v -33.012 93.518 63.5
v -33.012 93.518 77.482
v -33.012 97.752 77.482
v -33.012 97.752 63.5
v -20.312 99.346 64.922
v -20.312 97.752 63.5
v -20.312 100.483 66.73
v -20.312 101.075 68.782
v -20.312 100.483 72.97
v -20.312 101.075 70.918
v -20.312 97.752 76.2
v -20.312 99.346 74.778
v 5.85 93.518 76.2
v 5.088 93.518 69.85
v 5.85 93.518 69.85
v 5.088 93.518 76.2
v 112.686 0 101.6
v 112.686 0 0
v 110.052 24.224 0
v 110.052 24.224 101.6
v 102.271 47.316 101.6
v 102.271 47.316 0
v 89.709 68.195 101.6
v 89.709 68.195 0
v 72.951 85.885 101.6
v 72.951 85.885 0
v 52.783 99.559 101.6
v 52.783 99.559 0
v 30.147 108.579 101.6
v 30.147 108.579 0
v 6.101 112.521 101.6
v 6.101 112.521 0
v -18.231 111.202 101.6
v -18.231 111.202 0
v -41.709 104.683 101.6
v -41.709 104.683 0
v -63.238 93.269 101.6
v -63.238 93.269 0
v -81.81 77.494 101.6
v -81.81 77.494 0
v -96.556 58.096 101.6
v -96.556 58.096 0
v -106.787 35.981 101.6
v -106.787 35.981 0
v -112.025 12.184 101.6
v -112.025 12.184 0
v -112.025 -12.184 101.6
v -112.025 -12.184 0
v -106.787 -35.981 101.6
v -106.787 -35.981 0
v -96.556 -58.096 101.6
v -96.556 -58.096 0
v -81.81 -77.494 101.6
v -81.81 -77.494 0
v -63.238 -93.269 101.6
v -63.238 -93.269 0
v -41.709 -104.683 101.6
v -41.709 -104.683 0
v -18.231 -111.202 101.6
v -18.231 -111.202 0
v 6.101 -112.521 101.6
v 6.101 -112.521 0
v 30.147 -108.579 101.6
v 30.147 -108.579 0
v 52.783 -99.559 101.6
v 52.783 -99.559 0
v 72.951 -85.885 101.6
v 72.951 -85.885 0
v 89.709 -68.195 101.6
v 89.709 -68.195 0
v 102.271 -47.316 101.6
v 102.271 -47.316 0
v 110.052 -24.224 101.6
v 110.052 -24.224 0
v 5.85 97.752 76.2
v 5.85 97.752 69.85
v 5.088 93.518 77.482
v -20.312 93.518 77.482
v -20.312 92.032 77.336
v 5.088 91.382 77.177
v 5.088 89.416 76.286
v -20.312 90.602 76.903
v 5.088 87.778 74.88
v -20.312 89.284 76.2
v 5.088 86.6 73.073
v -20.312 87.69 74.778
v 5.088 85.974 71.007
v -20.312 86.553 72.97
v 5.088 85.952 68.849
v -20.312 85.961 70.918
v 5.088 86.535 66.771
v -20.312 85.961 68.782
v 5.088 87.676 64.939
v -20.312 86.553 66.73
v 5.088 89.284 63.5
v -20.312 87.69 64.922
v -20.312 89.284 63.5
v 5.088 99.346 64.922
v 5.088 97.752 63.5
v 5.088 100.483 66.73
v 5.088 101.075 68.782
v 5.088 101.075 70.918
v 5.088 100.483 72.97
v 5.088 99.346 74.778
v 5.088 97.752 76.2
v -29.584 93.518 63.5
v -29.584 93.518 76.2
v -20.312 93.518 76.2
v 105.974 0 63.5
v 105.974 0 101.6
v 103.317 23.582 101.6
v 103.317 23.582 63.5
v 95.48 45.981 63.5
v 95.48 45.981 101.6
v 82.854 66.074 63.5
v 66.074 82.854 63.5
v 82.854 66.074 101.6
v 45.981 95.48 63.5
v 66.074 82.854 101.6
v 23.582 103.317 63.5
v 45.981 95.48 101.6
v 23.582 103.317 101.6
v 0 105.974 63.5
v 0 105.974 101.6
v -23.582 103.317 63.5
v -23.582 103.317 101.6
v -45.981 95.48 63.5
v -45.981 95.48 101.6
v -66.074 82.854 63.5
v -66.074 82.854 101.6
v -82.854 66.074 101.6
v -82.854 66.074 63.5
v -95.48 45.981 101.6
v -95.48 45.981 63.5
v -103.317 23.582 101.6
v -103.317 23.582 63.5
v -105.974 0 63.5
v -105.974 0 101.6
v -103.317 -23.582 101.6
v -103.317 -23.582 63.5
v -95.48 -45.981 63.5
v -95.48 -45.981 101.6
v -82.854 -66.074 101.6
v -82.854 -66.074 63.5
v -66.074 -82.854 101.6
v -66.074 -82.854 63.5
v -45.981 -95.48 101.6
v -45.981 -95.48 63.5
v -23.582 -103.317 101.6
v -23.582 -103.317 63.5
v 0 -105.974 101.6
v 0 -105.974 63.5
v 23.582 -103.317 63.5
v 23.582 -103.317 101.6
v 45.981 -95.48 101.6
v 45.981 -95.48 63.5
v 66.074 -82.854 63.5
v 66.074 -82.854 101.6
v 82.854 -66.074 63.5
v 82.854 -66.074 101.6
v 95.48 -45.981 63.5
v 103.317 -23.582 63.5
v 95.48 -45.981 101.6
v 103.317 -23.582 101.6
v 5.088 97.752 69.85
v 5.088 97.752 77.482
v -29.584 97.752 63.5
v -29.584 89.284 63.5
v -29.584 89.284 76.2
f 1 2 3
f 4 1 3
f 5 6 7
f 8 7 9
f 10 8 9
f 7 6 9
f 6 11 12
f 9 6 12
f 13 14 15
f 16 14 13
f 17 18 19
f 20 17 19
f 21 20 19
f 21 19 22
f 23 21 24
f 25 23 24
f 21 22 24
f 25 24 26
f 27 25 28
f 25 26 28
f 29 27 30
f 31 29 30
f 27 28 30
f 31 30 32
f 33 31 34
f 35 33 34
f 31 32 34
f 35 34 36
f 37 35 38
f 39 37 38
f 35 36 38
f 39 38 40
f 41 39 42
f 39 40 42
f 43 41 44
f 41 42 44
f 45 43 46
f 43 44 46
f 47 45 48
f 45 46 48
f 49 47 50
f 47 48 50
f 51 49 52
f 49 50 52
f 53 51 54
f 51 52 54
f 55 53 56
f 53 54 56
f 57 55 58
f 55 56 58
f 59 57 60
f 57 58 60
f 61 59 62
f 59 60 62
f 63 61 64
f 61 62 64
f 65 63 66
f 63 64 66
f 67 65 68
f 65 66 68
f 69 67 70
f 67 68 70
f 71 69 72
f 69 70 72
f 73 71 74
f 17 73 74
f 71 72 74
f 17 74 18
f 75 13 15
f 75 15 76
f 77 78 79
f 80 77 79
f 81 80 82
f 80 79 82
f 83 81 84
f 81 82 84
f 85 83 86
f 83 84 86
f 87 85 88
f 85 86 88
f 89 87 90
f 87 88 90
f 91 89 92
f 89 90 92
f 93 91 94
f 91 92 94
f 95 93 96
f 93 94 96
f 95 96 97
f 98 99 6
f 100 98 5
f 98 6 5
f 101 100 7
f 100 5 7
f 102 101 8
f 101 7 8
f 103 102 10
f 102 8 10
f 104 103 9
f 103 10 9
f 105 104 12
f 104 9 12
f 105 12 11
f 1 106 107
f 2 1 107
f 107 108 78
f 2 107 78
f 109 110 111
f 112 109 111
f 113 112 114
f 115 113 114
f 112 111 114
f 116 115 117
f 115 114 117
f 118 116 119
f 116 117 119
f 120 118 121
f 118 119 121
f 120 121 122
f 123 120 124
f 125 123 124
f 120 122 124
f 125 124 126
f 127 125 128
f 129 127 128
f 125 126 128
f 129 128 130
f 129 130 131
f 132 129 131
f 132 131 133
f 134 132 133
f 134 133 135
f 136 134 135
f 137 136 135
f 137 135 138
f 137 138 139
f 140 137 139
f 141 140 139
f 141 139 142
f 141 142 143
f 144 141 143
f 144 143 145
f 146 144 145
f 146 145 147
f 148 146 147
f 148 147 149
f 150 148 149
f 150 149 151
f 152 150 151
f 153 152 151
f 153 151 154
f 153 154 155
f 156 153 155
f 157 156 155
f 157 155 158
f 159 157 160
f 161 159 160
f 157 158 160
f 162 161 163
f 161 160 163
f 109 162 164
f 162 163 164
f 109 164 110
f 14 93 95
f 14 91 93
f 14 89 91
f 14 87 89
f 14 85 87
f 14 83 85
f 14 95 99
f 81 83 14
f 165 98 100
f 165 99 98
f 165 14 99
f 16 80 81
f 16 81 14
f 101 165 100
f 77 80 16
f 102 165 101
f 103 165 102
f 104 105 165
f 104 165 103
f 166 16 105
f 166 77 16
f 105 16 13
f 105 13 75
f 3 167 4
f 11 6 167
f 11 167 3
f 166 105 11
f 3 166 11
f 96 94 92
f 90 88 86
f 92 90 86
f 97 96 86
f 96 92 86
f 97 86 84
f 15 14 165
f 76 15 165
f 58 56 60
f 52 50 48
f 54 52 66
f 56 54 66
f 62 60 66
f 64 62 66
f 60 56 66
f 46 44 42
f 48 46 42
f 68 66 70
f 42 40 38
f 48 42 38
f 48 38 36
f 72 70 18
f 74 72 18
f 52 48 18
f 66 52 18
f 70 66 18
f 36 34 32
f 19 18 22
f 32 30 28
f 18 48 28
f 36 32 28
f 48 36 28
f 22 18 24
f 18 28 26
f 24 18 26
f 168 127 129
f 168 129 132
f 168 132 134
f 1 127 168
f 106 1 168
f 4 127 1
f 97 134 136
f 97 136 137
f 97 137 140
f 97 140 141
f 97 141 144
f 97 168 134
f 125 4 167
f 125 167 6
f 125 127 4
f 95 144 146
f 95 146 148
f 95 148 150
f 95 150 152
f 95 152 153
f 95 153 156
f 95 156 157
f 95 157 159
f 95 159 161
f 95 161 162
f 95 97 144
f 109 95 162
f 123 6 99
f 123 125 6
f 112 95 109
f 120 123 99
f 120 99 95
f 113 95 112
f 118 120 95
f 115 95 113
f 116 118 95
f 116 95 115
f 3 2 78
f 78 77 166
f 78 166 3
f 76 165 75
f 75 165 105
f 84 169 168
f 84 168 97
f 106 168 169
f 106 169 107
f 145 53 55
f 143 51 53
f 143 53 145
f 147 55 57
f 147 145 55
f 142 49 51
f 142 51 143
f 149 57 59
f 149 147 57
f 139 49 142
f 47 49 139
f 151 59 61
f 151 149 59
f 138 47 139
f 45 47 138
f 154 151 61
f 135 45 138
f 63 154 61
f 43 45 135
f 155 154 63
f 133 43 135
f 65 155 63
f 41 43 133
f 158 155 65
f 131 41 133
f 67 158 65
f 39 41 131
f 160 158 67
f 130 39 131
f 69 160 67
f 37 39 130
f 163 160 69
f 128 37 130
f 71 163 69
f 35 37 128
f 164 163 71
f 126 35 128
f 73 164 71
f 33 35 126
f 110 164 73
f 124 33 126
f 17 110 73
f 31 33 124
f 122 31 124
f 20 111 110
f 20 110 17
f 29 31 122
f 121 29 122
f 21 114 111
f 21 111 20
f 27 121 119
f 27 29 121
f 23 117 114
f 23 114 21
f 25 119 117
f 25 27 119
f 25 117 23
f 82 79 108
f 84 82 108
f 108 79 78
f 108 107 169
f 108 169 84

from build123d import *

# Parameters (mm, degrees)
F0_R      = 112.6860587027
F1_DEPTH  = 101.6
F2_R      = 105.9744016923
F3_DEPTH  = 88.9
F4_DEPTH  = 25.4
F5_DEPTH  = 25.4
F6_W      = 9.2725791037
F6_H      = 8.4680765867
F7_DEPTH  = 12.7
F8_R      = 7.6321412637
F9_DEPTH  = 25.4
F10_W     = 4.2340382934
F10_H     = 13.9821412637
F11_DEPTH = 38.1
F12_W     = 4.2340382934
F12_H     = 6.35
F13_DEPTH = 0.762


with BuildPart() as f1:
    # F0 (on Top) → F1 (new body)
    with BuildSketch(Plane.XY):
        Circle(F0_R)
    extrude(amount=F1_DEPTH)

    # F2 (on face) → F3 (cut)
    with BuildSketch(Plane.XY.offset(101.6)):
        Circle(F2_R)
    extrude(amount=-F3_DEPTH, mode=Mode.SUBTRACT)

    # F4 (add): a face of the model
    f4_faces = [f1.faces().sort_by_distance(p)[0] for p in [
        (0, 0, 12.7),
    ]]
    extrude(f4_faces, amount=F4_DEPTH)

    # F5 (add): a face of the model
    f5_faces = [f1.faces().sort_by_distance(p)[0] for p in [
        (0, 0, 38.1),
    ]]
    extrude(f5_faces, amount=F5_DEPTH)

    # F6 (on face) → F7 (join)
    with BuildSketch(Plane.XY.offset(63.5)):
        with Locations((-24.9477978796, 93.518204987)):
            Rectangle(F6_W, F6_H)
    extrude(amount=F7_DEPTH)

    # F8 (on face) → F9 (join)
    with BuildSketch(Plane.YZ.offset(-20.3115083277)):
        with Locations((93.518204987, 69.85)):
            Circle(F8_R)
    extrude(amount=F9_DEPTH)

    # F10 (on face) → F11 (join)
    with BuildSketch(Plane.YZ.offset(5.0884916723)):
        with Locations((95.6352241337, 70.4910706319)):
            Rectangle(F10_W, F10_H)
    extrude(amount=-F11_DEPTH)

    # F12 (on face) → F13 (join)
    with BuildSketch(Plane.YZ.offset(5.0884916723)):
        with Locations((95.6352241337, 73.025)):
            Rectangle(F12_W, F12_H)
    extrude(amount=F13_DEPTH)


solid = f1.part
